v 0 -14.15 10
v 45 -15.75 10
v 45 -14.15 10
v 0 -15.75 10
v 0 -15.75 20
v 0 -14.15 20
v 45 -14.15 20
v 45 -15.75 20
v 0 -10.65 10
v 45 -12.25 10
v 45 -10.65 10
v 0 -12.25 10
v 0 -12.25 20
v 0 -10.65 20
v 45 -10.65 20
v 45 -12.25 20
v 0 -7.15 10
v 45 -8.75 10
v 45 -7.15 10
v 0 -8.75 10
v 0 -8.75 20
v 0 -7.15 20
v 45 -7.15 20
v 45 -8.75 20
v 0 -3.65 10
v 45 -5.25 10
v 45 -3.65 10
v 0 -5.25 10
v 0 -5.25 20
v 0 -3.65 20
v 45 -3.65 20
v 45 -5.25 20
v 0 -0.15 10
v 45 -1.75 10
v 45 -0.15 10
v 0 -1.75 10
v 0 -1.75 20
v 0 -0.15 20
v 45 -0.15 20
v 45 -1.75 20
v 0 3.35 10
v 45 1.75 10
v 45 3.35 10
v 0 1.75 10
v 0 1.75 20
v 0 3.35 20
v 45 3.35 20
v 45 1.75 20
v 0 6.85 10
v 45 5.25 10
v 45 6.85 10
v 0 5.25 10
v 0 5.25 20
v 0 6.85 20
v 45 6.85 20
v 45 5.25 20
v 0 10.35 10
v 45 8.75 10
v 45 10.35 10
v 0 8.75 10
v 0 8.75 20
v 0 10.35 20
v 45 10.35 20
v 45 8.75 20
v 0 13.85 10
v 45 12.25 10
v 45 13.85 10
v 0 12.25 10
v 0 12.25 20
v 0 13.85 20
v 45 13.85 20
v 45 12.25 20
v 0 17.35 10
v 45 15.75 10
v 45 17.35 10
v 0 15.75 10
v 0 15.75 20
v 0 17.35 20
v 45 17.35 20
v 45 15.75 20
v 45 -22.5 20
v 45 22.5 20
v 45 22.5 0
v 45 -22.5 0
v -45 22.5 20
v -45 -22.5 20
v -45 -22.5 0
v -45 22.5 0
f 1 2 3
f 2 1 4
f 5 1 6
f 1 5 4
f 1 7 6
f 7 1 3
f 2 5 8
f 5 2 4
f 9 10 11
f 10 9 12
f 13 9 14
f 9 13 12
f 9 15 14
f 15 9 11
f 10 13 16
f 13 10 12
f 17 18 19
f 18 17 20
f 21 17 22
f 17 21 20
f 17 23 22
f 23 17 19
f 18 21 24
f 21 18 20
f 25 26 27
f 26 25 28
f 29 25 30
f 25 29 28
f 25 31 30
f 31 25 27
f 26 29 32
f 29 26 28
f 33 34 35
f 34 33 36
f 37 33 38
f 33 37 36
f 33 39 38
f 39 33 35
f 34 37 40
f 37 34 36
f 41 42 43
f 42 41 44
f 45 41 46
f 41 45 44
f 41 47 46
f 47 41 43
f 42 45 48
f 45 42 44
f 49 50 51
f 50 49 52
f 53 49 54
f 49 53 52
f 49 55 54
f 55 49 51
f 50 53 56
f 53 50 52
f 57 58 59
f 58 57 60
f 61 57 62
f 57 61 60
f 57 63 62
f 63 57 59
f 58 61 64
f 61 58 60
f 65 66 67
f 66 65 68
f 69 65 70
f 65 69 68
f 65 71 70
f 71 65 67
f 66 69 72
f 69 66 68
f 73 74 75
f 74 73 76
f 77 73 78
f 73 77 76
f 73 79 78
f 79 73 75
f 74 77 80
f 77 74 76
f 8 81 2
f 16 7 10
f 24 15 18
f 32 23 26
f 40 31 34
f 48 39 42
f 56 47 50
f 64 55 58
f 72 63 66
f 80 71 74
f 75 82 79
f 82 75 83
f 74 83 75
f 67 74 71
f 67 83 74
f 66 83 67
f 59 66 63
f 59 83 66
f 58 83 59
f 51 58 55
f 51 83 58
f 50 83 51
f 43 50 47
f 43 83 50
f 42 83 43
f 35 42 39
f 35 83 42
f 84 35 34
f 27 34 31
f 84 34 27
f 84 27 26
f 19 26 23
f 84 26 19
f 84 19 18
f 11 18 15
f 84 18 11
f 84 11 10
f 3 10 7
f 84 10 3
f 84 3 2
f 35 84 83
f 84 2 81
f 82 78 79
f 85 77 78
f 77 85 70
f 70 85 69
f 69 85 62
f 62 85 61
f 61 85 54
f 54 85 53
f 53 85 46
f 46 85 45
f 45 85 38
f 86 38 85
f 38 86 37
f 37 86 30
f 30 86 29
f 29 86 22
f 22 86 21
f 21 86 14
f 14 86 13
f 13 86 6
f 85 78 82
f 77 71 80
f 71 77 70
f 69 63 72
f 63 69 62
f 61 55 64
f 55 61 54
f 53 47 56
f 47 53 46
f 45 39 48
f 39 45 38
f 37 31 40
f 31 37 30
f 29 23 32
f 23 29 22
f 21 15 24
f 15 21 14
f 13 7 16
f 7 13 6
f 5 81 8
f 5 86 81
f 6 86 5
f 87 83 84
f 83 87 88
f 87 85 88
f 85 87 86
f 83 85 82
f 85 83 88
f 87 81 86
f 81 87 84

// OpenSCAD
// Drying rack for microscope slides
// Base block: 90 x 45 x 20 mm
// 10 slots: 77 x 1.6 x 10 mm, 3.5 mm spacing, open at top

$fn = 64;

block_x = 90;
block_y = 45;
block_z = 20;

slot_x = 77;
slot_w = 1.6;
slot_z = 10;
slot_z_cut = slot_z + 0.01; // Extend past top face to avoid coplanar faces

slot_spacing = 3.5;
num_slots = 10;

slot_y_start = -(num_slots - 1) / 2 * slot_spacing;

difference() {
    // Block sits on z=0, extends to z=20
    translate([0, 0, block_z / 2]) {
        cube([block_x, block_y, block_z], center = true);
    }
    
    // Slots cut from top (z=10 to z=20)
    for (i = [0 : num_slots - 1]) {
        slot_y = slot_y_start + i * slot_spacing;
        translate([0, slot_y, block_z - slot_z]) {
            cube([slot_x, slot_w, slot_z_cut], center = false);
        }
    }
}
